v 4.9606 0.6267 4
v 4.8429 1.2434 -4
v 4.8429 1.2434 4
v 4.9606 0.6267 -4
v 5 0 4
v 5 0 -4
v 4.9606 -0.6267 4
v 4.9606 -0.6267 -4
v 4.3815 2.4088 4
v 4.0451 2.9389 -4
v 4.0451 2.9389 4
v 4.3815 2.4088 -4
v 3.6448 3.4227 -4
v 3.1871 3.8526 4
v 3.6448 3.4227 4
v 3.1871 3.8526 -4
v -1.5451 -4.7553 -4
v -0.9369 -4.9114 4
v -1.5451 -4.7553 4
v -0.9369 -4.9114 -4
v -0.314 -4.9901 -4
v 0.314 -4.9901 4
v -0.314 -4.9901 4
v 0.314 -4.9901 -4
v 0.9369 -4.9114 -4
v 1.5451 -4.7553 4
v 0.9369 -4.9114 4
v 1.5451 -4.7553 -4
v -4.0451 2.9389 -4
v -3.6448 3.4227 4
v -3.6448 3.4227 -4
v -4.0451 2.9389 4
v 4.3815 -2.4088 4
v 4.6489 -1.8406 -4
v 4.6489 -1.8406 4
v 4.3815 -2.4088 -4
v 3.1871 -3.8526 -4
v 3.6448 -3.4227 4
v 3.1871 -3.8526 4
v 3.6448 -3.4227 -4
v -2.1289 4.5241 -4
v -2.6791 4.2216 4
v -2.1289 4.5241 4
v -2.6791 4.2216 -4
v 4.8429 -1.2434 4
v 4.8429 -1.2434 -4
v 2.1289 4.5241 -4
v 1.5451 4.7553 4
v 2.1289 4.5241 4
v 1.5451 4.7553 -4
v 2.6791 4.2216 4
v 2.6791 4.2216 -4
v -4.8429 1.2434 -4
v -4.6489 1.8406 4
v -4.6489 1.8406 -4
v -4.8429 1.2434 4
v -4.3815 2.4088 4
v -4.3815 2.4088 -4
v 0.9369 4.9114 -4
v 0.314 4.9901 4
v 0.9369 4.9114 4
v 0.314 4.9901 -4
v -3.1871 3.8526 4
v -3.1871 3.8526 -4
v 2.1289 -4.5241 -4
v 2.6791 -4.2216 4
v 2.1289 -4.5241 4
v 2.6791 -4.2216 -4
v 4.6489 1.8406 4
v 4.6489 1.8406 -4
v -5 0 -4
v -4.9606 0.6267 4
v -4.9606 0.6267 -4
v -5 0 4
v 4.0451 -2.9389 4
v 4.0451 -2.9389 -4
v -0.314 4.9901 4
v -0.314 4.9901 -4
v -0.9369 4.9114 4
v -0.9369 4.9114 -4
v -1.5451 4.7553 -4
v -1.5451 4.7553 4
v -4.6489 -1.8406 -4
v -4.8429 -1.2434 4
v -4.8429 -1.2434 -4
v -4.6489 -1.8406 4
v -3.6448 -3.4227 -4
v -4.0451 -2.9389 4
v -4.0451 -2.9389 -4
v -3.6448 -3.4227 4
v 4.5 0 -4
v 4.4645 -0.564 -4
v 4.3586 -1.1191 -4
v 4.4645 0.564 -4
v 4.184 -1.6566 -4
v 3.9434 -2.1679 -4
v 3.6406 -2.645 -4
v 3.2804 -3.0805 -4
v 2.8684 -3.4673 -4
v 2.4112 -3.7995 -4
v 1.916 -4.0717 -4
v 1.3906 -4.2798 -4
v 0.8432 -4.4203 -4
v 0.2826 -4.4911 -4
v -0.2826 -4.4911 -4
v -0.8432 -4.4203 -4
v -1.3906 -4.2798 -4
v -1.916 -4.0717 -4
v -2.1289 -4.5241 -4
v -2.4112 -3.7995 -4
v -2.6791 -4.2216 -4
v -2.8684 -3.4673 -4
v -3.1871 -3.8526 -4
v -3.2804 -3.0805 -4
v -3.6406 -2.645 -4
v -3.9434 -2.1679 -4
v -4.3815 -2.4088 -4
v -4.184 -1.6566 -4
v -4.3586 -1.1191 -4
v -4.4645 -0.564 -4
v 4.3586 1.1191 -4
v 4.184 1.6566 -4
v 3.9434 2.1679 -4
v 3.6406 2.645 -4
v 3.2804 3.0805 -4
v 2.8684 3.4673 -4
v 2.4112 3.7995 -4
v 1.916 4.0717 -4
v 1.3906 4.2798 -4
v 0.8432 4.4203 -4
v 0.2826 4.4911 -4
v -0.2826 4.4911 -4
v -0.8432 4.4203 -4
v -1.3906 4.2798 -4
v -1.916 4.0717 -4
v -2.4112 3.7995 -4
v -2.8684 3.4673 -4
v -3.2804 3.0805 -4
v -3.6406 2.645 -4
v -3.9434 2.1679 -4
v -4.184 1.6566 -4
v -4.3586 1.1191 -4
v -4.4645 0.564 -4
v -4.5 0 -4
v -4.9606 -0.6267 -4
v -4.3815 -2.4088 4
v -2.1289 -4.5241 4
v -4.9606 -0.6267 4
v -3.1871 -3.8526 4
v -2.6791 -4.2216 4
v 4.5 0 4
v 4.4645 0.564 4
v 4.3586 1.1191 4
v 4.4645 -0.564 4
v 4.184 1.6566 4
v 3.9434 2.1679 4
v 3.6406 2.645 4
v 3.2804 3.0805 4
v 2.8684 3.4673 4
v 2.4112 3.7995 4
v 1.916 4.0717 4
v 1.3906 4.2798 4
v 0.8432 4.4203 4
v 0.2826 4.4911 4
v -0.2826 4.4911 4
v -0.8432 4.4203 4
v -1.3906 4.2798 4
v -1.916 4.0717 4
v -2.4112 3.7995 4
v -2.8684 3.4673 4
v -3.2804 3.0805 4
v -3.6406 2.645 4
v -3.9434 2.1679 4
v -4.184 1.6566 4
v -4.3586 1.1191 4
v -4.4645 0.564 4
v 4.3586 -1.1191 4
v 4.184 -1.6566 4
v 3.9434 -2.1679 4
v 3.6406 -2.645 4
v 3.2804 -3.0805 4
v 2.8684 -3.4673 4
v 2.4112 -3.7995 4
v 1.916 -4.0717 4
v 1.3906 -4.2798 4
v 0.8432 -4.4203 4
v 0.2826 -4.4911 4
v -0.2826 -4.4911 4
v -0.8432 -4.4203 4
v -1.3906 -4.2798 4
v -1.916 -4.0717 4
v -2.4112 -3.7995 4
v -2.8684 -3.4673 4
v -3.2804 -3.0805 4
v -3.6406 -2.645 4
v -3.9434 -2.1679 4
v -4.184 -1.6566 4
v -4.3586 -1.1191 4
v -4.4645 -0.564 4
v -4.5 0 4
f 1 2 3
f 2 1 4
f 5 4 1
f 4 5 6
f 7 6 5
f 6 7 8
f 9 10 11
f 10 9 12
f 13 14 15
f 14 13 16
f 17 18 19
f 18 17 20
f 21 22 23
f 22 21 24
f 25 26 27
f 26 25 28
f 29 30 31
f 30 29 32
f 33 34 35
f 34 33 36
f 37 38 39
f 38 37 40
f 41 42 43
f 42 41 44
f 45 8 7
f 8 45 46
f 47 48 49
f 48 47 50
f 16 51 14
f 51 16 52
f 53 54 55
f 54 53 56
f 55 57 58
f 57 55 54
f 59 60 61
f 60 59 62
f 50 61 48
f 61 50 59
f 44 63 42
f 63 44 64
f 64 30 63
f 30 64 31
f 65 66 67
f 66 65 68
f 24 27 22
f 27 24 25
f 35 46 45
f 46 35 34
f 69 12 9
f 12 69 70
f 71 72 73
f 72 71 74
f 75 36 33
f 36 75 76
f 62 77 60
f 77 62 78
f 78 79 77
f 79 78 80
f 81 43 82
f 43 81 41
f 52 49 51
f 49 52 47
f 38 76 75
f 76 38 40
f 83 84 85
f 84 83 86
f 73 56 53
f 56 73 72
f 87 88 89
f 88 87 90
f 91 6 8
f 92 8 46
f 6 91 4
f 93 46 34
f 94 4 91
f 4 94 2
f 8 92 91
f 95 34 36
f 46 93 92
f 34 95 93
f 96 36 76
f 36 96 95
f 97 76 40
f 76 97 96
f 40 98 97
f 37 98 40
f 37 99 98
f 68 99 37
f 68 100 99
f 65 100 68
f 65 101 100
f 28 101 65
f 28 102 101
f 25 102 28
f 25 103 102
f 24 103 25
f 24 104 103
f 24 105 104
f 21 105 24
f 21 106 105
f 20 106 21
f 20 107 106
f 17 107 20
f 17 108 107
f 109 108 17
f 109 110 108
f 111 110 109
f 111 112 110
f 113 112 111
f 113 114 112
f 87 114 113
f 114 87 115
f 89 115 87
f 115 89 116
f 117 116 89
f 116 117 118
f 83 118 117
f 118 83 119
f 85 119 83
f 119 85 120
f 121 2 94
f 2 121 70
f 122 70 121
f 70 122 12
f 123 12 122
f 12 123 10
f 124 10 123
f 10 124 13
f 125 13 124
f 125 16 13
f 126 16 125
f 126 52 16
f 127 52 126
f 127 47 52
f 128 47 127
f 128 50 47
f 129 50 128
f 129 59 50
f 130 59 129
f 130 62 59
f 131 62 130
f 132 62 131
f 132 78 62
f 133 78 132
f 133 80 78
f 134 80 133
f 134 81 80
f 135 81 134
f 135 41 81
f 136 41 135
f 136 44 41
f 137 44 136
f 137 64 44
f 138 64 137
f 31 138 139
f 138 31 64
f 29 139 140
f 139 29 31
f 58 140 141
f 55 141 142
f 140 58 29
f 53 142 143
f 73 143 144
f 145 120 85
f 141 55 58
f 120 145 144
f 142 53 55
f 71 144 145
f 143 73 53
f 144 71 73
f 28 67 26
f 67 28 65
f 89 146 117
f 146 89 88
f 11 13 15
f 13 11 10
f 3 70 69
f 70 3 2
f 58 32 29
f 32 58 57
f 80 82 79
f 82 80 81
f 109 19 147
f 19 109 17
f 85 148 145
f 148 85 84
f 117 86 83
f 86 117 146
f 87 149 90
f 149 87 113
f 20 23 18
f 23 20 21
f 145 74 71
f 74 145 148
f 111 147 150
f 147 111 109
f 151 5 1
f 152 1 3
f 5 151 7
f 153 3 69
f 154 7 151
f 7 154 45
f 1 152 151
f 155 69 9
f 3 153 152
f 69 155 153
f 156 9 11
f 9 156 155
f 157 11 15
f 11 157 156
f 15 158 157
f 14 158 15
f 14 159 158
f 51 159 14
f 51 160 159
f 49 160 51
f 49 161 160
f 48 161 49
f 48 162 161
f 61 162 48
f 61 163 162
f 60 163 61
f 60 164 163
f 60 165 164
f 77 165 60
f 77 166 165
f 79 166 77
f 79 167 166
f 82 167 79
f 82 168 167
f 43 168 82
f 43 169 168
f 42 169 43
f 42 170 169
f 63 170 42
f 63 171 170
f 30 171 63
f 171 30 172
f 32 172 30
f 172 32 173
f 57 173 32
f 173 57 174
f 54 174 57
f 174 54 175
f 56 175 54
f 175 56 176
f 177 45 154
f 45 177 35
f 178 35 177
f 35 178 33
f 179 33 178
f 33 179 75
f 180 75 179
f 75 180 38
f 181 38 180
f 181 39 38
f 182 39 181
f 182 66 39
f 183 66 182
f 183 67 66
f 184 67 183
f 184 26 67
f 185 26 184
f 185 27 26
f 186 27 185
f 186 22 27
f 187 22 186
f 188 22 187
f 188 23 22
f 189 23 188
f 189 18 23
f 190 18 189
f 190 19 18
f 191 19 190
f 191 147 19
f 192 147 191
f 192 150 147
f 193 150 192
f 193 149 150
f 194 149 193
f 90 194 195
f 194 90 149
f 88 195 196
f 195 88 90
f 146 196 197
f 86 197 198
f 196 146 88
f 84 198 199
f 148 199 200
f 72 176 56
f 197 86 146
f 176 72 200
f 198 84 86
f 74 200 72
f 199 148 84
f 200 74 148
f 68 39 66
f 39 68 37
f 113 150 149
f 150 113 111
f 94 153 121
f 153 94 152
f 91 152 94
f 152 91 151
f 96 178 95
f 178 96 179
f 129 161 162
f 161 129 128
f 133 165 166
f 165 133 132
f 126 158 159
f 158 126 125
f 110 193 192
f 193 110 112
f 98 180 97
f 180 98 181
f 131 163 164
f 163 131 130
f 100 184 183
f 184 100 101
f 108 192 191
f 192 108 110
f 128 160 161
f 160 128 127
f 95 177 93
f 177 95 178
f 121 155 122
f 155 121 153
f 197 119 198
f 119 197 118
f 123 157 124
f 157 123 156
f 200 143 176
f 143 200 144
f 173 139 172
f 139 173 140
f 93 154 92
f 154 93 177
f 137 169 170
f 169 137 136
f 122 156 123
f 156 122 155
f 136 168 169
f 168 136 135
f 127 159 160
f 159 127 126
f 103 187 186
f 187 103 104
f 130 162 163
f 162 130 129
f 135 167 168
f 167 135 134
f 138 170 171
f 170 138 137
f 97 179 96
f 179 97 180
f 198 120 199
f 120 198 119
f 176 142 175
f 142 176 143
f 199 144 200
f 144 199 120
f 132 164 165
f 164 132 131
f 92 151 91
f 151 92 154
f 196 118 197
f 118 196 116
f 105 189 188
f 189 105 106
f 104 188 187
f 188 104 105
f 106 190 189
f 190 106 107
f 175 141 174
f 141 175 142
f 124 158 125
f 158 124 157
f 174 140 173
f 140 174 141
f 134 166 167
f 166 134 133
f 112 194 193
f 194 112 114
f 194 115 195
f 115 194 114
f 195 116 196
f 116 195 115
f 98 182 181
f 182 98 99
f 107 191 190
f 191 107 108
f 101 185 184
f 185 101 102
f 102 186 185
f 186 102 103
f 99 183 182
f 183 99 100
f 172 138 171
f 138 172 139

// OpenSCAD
$fn = 50;


difference() {
	union() {
		translate(v = [0, 0, -4.0000000000]) {
			cylinder(h = 8, r = 5.0000000000);
		}
	}
	union() {
		translate(v = [0, 0, -100.0000000000]) {
			cylinder(h = 200, r = 4.5000000000);
		}
	}
}
